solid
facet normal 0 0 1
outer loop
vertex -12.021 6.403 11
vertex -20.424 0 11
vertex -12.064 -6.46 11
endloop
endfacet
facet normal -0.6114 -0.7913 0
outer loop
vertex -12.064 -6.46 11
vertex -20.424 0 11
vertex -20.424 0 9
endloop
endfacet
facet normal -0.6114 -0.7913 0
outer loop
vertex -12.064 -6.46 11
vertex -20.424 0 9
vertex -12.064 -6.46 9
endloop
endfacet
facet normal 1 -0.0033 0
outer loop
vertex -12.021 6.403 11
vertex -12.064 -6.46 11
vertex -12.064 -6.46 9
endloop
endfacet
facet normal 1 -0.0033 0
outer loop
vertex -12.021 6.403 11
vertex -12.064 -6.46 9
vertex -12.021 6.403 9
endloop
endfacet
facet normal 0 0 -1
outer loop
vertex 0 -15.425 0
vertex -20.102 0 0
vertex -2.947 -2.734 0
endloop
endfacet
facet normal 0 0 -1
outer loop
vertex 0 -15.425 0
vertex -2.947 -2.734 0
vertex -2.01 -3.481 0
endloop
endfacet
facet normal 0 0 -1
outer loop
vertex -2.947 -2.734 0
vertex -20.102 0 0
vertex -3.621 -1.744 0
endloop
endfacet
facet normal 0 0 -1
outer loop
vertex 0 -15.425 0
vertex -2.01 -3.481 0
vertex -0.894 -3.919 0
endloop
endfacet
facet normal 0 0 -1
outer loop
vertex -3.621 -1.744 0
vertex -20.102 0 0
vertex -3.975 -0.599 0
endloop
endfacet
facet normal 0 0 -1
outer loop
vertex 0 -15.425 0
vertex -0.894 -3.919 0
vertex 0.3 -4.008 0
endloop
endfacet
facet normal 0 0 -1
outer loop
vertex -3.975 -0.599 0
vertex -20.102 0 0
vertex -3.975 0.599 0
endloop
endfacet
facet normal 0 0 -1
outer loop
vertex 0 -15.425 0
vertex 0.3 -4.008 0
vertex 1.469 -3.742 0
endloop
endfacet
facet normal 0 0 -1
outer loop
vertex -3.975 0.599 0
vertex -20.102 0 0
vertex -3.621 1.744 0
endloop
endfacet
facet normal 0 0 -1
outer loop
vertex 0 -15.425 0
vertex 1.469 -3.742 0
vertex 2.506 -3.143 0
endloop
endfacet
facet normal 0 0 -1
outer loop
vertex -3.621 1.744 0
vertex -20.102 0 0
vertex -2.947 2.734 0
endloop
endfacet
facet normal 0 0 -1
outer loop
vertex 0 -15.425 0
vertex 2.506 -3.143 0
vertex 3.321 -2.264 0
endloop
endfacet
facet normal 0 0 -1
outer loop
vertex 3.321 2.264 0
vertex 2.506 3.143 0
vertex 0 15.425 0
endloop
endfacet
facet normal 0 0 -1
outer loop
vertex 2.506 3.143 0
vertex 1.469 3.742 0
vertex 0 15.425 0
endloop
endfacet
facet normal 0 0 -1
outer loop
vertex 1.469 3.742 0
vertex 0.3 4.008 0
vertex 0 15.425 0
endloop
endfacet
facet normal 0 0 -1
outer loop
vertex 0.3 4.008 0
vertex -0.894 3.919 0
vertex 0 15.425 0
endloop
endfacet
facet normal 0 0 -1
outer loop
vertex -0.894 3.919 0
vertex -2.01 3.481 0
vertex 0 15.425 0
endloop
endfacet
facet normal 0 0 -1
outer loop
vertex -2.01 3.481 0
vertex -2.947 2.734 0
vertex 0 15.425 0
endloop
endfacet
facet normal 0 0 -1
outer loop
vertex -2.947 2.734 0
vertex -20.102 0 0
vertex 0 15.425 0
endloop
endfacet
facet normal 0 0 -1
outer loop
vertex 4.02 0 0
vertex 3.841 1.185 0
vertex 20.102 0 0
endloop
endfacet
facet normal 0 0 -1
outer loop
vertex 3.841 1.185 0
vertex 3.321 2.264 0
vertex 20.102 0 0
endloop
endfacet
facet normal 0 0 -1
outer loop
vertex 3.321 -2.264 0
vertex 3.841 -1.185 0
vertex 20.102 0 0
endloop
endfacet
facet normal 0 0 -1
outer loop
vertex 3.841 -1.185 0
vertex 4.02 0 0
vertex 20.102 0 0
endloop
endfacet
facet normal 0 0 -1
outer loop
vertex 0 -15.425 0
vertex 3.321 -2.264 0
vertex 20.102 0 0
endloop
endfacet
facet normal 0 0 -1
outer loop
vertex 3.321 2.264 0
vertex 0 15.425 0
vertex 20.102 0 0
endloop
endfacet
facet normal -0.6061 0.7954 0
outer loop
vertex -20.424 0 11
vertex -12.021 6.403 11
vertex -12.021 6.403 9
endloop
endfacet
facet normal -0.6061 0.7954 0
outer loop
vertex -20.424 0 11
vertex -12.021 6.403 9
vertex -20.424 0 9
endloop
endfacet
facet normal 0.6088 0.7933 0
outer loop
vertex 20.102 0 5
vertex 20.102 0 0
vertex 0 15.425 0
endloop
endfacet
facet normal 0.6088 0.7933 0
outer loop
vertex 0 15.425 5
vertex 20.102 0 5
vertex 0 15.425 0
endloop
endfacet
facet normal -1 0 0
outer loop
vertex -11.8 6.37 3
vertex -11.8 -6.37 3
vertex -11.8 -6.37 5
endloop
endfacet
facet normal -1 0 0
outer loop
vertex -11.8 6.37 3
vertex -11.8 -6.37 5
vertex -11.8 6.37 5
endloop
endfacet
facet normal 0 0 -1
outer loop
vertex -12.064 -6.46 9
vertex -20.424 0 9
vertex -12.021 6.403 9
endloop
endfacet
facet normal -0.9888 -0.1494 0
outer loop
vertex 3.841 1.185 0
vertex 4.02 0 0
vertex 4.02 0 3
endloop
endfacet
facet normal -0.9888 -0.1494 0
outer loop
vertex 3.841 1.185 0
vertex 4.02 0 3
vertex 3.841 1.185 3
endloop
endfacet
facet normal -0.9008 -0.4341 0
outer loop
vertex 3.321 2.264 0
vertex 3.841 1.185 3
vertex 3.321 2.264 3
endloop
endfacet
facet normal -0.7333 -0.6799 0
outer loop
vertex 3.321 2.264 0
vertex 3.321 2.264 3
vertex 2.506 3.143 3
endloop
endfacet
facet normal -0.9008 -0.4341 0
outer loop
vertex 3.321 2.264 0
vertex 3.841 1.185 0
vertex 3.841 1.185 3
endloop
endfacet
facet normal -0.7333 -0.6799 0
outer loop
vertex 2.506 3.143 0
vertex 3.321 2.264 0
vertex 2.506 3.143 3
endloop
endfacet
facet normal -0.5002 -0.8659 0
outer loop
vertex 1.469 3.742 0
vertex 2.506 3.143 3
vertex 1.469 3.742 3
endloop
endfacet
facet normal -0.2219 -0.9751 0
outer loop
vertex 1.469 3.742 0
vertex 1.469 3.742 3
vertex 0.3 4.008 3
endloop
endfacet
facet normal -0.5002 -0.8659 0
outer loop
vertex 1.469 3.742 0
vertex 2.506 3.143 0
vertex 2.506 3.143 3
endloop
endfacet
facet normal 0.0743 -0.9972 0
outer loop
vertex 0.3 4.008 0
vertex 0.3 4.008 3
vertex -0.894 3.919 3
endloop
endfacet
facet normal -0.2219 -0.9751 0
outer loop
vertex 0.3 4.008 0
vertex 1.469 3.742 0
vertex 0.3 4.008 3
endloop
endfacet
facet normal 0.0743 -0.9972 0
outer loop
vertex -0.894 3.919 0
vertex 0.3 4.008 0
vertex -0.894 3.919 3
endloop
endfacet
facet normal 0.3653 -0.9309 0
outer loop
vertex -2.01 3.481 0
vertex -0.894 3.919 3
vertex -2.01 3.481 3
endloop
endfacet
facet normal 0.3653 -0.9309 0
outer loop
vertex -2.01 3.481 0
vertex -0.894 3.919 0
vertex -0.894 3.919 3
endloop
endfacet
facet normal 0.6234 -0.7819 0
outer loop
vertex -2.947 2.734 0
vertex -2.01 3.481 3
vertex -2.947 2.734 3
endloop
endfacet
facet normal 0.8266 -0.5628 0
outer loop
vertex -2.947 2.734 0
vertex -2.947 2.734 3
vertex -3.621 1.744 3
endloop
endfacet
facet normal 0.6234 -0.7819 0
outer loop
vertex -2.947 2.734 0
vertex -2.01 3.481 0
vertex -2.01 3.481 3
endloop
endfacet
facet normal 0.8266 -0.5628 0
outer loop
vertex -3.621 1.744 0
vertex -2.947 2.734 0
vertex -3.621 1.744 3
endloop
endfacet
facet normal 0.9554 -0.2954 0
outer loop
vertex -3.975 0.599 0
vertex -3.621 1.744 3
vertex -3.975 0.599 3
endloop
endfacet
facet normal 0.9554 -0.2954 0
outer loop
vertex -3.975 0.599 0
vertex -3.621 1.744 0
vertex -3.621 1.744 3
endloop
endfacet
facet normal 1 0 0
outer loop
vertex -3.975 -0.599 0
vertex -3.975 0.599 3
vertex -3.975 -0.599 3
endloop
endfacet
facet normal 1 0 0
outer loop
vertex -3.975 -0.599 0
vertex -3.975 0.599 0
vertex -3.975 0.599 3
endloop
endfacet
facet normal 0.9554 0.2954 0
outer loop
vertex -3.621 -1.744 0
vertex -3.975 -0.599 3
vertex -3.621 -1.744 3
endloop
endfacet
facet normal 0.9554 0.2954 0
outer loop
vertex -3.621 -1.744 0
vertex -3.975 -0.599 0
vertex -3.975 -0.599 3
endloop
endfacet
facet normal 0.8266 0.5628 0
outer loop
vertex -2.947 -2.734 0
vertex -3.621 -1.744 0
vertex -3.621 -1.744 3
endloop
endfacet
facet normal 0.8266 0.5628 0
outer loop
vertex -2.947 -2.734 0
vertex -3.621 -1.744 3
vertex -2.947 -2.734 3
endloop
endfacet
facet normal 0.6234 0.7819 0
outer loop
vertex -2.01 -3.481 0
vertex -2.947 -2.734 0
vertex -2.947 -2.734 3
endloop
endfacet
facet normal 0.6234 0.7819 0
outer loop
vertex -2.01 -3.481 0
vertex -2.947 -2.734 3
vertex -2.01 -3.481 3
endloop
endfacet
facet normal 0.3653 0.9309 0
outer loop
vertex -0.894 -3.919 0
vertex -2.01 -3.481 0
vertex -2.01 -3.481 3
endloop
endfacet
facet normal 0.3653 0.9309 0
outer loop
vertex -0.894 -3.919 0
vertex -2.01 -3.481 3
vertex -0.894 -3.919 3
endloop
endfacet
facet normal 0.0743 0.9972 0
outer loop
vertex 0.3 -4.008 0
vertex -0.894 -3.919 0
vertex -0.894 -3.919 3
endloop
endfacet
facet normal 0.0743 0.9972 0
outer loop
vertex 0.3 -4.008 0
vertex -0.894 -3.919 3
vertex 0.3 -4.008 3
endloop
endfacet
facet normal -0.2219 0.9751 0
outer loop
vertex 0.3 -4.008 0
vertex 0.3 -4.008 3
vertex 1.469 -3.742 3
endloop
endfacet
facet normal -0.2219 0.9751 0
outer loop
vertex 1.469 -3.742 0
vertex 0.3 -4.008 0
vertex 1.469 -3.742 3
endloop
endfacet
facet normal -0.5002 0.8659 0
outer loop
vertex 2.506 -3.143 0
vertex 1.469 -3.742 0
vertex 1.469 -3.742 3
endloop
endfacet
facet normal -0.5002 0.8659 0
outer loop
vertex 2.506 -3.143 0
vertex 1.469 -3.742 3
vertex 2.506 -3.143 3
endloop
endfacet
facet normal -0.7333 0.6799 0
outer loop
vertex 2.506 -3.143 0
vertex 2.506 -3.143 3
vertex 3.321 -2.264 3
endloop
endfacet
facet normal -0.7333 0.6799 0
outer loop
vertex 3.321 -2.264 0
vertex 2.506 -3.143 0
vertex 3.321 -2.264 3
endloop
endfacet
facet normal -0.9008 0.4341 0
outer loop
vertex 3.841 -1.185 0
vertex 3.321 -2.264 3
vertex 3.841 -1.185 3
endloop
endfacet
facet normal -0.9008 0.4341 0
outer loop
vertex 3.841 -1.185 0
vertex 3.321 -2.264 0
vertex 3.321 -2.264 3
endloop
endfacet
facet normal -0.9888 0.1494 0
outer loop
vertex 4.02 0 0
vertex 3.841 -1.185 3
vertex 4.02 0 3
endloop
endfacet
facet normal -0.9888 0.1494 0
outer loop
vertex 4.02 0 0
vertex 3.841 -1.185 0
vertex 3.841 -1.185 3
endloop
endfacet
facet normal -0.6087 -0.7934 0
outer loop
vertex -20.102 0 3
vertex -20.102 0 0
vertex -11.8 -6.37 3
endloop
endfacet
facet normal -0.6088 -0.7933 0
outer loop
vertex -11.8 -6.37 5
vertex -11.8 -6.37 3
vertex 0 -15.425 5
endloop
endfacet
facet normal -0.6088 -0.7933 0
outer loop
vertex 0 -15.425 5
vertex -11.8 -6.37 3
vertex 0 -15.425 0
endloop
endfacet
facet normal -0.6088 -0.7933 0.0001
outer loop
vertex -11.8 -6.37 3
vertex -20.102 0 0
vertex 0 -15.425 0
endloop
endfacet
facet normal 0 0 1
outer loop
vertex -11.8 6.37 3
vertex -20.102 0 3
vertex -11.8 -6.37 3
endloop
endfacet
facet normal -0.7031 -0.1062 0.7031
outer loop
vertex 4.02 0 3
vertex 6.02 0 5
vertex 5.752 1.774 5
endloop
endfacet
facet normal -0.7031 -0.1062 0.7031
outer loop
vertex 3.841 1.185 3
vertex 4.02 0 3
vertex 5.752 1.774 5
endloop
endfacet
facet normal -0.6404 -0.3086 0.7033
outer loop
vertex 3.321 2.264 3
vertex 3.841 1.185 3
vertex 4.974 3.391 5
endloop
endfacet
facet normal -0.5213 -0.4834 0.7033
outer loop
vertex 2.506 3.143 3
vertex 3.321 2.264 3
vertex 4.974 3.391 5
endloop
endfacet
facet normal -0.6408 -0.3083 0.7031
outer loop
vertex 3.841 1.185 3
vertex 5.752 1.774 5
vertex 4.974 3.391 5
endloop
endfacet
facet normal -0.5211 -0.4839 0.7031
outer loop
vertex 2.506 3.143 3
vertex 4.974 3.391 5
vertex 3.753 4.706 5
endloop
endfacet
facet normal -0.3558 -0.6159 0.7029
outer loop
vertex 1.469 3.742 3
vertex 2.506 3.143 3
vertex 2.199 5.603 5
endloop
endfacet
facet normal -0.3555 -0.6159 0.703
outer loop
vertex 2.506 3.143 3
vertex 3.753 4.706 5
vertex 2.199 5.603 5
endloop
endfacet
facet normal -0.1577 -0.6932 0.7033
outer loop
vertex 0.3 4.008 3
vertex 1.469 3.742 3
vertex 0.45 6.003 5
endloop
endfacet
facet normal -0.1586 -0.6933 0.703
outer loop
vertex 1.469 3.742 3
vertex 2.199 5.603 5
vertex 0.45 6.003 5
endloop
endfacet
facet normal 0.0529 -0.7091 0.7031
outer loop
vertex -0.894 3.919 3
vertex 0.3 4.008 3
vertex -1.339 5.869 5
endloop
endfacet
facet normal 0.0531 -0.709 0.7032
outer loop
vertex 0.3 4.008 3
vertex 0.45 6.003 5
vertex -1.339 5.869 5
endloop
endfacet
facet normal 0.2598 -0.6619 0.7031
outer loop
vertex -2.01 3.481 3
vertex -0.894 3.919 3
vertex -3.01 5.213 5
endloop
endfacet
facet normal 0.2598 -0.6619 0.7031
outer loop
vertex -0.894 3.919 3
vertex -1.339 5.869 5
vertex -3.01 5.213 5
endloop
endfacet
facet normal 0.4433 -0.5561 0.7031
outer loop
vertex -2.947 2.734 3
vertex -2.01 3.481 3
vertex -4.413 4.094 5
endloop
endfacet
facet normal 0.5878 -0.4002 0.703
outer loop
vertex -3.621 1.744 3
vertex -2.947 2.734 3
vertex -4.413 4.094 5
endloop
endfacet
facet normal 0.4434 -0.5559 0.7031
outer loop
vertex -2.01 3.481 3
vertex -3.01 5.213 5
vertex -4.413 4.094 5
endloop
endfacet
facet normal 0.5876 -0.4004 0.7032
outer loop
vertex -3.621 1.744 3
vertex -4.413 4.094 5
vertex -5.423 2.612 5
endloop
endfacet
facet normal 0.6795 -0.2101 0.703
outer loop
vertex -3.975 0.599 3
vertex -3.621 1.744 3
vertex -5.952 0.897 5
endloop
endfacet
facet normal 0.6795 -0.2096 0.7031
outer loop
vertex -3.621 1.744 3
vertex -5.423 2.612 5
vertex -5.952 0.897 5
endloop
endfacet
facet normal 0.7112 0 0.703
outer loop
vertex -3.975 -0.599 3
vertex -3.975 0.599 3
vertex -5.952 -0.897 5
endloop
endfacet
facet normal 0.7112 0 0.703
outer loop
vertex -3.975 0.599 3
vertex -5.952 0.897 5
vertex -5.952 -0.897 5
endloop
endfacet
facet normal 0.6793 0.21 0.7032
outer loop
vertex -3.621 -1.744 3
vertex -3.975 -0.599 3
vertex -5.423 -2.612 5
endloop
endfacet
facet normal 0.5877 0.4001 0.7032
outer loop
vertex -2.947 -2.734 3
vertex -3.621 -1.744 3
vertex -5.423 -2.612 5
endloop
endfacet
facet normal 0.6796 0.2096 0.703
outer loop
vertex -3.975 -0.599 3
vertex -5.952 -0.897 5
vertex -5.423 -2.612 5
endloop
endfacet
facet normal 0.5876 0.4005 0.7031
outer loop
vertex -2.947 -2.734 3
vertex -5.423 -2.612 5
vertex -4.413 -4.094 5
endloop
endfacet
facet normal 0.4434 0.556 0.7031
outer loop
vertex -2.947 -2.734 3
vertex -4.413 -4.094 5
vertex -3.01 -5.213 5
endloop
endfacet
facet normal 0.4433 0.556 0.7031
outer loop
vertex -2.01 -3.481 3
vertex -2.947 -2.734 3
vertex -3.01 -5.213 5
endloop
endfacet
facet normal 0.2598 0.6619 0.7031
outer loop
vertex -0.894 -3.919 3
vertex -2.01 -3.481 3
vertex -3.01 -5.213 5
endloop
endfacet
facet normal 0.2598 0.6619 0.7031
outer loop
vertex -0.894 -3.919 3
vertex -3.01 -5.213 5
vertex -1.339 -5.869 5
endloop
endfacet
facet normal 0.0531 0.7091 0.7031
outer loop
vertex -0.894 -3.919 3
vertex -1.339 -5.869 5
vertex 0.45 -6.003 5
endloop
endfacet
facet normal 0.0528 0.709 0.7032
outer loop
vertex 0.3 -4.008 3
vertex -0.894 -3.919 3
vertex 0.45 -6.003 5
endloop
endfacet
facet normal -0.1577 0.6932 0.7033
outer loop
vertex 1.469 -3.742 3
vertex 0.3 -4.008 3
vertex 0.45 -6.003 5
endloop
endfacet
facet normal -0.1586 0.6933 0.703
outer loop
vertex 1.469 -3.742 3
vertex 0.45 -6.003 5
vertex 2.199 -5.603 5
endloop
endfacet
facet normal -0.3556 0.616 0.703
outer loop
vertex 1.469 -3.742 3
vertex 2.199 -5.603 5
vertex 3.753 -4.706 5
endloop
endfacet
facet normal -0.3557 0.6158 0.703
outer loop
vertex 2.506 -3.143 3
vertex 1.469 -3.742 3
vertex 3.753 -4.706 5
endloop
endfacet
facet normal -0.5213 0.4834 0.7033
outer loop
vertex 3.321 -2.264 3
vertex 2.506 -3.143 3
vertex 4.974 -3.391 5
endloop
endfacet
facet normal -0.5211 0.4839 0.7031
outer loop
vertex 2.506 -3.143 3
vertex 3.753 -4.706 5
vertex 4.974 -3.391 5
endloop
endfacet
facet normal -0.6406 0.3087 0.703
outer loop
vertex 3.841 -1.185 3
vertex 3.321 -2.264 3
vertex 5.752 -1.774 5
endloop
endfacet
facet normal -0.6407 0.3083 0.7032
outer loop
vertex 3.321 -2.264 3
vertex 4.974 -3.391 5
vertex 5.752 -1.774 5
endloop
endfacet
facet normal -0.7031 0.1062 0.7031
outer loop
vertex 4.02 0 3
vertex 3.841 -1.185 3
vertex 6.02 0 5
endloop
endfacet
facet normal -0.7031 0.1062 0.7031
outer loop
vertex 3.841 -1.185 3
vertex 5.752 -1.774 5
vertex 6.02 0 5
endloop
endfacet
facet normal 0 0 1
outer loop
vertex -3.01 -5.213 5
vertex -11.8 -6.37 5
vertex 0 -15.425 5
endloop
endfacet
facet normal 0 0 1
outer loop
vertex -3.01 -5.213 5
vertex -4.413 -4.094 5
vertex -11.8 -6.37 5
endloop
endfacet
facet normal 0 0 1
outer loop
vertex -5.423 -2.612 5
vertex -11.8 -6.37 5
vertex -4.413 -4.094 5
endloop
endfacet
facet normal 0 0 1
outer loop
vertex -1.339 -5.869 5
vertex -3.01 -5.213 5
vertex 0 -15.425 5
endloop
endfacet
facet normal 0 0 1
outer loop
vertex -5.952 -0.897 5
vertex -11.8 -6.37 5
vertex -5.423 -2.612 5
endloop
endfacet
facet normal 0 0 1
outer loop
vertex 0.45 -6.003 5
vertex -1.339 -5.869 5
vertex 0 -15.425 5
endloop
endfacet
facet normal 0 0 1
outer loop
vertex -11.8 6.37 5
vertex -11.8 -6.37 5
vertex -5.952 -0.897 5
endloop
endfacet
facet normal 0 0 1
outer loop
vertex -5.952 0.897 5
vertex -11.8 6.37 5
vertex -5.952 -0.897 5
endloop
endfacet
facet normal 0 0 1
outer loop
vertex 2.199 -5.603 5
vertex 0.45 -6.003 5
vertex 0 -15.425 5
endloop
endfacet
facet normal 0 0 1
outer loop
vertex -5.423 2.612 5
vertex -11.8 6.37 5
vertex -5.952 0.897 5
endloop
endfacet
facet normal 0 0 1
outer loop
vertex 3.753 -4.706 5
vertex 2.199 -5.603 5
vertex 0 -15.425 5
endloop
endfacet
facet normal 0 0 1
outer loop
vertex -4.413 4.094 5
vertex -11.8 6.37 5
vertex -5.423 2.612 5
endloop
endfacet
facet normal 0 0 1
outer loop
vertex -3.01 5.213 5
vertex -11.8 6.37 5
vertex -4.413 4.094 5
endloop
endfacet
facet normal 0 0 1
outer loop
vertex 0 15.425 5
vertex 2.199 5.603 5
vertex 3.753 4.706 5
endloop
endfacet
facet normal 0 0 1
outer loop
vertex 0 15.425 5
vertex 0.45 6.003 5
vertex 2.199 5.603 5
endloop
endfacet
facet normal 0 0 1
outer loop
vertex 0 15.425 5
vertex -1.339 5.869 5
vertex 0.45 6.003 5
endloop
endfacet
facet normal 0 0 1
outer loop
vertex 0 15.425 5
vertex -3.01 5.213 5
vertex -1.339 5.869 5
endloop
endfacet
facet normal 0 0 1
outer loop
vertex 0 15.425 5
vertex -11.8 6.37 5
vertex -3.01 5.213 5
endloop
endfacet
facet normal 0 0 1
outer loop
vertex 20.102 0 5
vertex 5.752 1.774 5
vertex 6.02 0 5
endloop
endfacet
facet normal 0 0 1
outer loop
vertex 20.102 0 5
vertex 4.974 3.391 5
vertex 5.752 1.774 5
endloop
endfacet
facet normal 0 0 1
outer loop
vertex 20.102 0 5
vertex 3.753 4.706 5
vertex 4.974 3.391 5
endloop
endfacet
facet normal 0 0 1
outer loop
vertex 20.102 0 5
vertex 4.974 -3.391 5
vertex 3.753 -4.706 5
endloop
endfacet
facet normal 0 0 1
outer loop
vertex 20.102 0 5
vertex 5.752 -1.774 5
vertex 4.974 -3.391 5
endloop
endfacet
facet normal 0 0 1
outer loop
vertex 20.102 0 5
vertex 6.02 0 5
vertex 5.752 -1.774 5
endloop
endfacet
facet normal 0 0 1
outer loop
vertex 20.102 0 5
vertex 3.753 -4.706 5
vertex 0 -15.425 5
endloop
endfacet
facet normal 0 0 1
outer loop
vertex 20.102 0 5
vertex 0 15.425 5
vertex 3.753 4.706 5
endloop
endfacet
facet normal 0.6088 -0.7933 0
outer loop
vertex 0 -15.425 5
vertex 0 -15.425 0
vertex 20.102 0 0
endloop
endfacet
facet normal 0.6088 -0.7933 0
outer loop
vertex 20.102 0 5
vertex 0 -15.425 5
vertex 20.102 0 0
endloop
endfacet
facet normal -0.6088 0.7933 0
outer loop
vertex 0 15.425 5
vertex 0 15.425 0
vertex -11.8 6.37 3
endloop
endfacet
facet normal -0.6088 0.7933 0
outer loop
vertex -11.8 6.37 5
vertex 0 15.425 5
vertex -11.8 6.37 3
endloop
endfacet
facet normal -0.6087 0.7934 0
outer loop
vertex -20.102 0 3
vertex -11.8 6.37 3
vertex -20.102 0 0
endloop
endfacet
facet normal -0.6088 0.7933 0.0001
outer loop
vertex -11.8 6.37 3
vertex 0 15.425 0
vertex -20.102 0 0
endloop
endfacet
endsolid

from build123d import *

# Parameters (mm, degrees)
F0_R     = 4.019544
F1_DEPTH = 5
F2_SIZE  = 2
F5_DEPTH = 25
F8_DEPTH = 2


with BuildPart() as f1:
    # F0 (on Top) → F1 (new body)
    with BuildSketch(Plane.XY):
        Polygon((0, -15.424556), (20.101673, 0), (0, 15.424556), (-20.101673, 0), align=None)
        Circle(F0_R, mode=Mode.SUBTRACT)
    extrude(amount=F1_DEPTH)

    # F2
    f2_edges = [f1.edges().sort_by_distance(p)[0] for p in [
        (-4.019544, 0, 5),
    ]]
    chamfer(f2_edges, length=F2_SIZE)

    # F4 (on offset) → F5 (cut)
    with BuildSketch(Plane.XY.offset(3)):
        Polygon((-11.799898, 6.696376), (-20.526785, 0), (-11.799898, -6.696376), align=None)
    extrude(amount=F5_DEPTH, mode=Mode.SUBTRACT)


with BuildPart() as f8:
    # F7 (on offset) → F8 (new body)
    with BuildSketch(Plane.XY.offset(11)):
        Polygon((-12.064234, -6.459591), (-12.020629, 6.402763), (-20.423705, 0), align=None)
    extrude(amount=-F8_DEPTH)


solid = Compound([f1.part, f8.part])
